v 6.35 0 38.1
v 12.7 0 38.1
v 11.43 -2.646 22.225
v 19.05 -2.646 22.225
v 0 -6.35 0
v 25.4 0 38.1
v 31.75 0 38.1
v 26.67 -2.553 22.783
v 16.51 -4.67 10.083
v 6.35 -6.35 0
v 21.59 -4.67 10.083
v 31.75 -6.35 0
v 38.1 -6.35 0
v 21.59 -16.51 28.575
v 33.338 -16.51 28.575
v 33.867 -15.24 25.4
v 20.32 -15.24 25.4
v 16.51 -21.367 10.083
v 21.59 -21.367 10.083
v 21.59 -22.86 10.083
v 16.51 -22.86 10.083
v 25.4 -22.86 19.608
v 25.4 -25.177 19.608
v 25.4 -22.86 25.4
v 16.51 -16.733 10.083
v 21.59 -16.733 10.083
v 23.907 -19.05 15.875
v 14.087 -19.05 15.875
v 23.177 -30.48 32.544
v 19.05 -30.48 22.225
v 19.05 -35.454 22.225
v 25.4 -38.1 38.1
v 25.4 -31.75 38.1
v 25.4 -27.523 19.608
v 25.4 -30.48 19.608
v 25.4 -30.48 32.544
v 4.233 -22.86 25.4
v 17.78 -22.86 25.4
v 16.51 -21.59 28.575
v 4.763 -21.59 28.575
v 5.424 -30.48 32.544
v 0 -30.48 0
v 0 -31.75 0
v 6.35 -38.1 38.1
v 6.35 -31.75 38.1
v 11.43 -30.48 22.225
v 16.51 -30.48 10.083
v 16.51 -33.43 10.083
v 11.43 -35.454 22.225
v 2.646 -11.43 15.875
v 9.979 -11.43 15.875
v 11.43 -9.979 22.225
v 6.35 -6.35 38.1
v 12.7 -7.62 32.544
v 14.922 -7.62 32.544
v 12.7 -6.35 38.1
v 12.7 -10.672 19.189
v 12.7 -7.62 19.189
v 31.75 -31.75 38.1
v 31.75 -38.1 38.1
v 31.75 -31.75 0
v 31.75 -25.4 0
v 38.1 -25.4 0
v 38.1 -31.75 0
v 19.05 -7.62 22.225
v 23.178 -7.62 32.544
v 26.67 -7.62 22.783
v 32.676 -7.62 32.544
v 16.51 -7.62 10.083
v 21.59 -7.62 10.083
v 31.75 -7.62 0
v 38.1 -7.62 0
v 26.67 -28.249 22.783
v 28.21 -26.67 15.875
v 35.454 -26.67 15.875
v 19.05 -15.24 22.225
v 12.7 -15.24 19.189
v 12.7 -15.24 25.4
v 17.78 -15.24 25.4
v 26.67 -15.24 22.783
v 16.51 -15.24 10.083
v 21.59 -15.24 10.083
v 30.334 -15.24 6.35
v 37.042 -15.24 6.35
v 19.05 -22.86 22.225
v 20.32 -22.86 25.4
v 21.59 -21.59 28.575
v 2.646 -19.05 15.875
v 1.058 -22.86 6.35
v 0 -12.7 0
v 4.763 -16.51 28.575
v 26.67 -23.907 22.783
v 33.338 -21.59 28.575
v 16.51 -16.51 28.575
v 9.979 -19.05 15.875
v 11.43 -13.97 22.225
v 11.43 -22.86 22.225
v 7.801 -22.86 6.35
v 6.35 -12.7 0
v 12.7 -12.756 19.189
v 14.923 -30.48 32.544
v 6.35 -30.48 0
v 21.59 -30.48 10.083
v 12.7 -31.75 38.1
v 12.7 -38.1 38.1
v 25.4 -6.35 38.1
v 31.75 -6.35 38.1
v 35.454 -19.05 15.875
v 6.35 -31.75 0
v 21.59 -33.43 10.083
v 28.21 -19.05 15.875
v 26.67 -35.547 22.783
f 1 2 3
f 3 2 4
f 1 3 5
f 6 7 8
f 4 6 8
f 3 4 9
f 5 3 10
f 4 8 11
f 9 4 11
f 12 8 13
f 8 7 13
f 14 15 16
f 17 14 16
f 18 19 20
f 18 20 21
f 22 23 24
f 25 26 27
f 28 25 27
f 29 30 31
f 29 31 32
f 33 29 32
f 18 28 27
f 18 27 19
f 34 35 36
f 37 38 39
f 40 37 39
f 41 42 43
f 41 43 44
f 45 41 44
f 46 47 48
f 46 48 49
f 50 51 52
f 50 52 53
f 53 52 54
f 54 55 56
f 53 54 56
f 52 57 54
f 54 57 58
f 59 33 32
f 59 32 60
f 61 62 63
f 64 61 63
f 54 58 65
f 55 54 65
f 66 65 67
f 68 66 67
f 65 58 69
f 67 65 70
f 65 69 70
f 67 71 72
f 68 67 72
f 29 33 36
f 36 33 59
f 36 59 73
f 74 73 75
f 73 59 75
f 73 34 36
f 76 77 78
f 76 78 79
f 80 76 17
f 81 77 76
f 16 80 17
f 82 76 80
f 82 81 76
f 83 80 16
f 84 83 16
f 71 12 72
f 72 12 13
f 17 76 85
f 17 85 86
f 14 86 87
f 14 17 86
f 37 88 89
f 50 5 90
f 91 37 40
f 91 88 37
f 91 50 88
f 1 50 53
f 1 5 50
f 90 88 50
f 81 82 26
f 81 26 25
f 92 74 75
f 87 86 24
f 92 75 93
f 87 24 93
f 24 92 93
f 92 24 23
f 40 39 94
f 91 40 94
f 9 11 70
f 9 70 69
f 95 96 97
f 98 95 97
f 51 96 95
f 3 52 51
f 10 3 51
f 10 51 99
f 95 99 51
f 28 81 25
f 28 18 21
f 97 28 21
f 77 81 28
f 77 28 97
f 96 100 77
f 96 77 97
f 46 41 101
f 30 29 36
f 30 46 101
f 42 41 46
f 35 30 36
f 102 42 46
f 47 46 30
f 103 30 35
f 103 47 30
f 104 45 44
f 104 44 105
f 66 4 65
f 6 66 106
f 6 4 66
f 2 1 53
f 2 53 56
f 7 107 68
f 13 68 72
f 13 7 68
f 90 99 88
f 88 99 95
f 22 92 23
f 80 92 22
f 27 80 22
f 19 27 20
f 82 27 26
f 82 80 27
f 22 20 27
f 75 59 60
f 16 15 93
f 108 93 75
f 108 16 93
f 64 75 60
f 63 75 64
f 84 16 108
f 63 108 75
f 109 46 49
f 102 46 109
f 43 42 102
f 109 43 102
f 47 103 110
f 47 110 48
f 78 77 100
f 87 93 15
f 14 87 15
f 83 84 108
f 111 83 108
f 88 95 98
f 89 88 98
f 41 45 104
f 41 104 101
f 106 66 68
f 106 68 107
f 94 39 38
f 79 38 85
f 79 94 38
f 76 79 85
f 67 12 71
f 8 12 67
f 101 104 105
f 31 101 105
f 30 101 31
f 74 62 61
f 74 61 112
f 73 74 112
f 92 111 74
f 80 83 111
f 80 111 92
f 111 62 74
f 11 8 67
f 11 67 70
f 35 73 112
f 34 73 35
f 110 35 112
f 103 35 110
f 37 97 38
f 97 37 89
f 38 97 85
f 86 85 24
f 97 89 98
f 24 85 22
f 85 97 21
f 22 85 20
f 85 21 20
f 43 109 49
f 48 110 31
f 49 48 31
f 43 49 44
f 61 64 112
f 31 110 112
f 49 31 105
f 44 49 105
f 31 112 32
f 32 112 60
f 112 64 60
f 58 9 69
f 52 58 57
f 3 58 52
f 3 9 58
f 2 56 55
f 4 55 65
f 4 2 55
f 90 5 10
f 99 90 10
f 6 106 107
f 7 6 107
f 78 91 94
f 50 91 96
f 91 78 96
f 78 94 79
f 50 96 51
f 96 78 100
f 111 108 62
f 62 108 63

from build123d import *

# Parameters (mm, degrees)
F0_W     = 38.1
F0_H     = 38.1
F1_DEPTH = 38.1
F4_DEPTH = 38.1
F6_DEPTH = 38.1
F7_W     = 25.4
F7_H     = 7.62
F8_DEPTH = 38.1


with BuildPart() as f1:
    # F0 (on Front) → F1 (new body)
    with BuildSketch(Plane.XZ):
        with Locations((19.05, 19.05)):
            Rectangle(F0_W, F0_H)
    extrude(amount=F1_DEPTH)

    # F3 (on offset) → F4 (cut)
    with BuildSketch(Plane.YZ.offset(38.1)):
        Polygon((-6.35, 38.1), (-31.75, 38.1), (-26.67, 15.875), (-21.59, 28.575), (-16.51, 28.575), (-11.43, 15.875), align=None)
        Polygon((-19.05, 15.875), (-25.4, 0), (-12.7, 0), align=None)
        Polygon((0, 0), (0, 38.1), (-6.35, 0), align=None)
        Polygon((-31.75, 0), (-38.1, 38.1), (-38.1, 0), align=None)
    extrude(amount=-F4_DEPTH, mode=Mode.SUBTRACT)

    # F5 (on Front) → F6 (cut)
    with BuildSketch(Plane.XZ):
        Polygon((38.1, 0), (38.1, 38.1), (31.75, 38.1), align=None)
        Polygon((6.35, 0), (31.75, 0), (26.67, 22.782558), (21.59, 10.082558), (16.51, 10.082558), (11.43, 22.225), align=None)
        Polygon((19.05, 22.225), (25.4, 38.1), (12.7, 38.1), align=None)
        Polygon((0, 38.1), (0, 0), (6.35, 38.1), align=None)
    extrude(amount=F6_DEPTH, mode=Mode.SUBTRACT)

    # F7 (on Top) → F8 (cut)
    with BuildSketch(Plane.XY):
        with Locations((25.4, -11.43)):
            Rectangle(F7_W, F7_H)
        with Locations((12.7, -26.67)):
            Rectangle(F7_W, F7_H)
    extrude(amount=F8_DEPTH, mode=Mode.SUBTRACT)


solid = f1.part
